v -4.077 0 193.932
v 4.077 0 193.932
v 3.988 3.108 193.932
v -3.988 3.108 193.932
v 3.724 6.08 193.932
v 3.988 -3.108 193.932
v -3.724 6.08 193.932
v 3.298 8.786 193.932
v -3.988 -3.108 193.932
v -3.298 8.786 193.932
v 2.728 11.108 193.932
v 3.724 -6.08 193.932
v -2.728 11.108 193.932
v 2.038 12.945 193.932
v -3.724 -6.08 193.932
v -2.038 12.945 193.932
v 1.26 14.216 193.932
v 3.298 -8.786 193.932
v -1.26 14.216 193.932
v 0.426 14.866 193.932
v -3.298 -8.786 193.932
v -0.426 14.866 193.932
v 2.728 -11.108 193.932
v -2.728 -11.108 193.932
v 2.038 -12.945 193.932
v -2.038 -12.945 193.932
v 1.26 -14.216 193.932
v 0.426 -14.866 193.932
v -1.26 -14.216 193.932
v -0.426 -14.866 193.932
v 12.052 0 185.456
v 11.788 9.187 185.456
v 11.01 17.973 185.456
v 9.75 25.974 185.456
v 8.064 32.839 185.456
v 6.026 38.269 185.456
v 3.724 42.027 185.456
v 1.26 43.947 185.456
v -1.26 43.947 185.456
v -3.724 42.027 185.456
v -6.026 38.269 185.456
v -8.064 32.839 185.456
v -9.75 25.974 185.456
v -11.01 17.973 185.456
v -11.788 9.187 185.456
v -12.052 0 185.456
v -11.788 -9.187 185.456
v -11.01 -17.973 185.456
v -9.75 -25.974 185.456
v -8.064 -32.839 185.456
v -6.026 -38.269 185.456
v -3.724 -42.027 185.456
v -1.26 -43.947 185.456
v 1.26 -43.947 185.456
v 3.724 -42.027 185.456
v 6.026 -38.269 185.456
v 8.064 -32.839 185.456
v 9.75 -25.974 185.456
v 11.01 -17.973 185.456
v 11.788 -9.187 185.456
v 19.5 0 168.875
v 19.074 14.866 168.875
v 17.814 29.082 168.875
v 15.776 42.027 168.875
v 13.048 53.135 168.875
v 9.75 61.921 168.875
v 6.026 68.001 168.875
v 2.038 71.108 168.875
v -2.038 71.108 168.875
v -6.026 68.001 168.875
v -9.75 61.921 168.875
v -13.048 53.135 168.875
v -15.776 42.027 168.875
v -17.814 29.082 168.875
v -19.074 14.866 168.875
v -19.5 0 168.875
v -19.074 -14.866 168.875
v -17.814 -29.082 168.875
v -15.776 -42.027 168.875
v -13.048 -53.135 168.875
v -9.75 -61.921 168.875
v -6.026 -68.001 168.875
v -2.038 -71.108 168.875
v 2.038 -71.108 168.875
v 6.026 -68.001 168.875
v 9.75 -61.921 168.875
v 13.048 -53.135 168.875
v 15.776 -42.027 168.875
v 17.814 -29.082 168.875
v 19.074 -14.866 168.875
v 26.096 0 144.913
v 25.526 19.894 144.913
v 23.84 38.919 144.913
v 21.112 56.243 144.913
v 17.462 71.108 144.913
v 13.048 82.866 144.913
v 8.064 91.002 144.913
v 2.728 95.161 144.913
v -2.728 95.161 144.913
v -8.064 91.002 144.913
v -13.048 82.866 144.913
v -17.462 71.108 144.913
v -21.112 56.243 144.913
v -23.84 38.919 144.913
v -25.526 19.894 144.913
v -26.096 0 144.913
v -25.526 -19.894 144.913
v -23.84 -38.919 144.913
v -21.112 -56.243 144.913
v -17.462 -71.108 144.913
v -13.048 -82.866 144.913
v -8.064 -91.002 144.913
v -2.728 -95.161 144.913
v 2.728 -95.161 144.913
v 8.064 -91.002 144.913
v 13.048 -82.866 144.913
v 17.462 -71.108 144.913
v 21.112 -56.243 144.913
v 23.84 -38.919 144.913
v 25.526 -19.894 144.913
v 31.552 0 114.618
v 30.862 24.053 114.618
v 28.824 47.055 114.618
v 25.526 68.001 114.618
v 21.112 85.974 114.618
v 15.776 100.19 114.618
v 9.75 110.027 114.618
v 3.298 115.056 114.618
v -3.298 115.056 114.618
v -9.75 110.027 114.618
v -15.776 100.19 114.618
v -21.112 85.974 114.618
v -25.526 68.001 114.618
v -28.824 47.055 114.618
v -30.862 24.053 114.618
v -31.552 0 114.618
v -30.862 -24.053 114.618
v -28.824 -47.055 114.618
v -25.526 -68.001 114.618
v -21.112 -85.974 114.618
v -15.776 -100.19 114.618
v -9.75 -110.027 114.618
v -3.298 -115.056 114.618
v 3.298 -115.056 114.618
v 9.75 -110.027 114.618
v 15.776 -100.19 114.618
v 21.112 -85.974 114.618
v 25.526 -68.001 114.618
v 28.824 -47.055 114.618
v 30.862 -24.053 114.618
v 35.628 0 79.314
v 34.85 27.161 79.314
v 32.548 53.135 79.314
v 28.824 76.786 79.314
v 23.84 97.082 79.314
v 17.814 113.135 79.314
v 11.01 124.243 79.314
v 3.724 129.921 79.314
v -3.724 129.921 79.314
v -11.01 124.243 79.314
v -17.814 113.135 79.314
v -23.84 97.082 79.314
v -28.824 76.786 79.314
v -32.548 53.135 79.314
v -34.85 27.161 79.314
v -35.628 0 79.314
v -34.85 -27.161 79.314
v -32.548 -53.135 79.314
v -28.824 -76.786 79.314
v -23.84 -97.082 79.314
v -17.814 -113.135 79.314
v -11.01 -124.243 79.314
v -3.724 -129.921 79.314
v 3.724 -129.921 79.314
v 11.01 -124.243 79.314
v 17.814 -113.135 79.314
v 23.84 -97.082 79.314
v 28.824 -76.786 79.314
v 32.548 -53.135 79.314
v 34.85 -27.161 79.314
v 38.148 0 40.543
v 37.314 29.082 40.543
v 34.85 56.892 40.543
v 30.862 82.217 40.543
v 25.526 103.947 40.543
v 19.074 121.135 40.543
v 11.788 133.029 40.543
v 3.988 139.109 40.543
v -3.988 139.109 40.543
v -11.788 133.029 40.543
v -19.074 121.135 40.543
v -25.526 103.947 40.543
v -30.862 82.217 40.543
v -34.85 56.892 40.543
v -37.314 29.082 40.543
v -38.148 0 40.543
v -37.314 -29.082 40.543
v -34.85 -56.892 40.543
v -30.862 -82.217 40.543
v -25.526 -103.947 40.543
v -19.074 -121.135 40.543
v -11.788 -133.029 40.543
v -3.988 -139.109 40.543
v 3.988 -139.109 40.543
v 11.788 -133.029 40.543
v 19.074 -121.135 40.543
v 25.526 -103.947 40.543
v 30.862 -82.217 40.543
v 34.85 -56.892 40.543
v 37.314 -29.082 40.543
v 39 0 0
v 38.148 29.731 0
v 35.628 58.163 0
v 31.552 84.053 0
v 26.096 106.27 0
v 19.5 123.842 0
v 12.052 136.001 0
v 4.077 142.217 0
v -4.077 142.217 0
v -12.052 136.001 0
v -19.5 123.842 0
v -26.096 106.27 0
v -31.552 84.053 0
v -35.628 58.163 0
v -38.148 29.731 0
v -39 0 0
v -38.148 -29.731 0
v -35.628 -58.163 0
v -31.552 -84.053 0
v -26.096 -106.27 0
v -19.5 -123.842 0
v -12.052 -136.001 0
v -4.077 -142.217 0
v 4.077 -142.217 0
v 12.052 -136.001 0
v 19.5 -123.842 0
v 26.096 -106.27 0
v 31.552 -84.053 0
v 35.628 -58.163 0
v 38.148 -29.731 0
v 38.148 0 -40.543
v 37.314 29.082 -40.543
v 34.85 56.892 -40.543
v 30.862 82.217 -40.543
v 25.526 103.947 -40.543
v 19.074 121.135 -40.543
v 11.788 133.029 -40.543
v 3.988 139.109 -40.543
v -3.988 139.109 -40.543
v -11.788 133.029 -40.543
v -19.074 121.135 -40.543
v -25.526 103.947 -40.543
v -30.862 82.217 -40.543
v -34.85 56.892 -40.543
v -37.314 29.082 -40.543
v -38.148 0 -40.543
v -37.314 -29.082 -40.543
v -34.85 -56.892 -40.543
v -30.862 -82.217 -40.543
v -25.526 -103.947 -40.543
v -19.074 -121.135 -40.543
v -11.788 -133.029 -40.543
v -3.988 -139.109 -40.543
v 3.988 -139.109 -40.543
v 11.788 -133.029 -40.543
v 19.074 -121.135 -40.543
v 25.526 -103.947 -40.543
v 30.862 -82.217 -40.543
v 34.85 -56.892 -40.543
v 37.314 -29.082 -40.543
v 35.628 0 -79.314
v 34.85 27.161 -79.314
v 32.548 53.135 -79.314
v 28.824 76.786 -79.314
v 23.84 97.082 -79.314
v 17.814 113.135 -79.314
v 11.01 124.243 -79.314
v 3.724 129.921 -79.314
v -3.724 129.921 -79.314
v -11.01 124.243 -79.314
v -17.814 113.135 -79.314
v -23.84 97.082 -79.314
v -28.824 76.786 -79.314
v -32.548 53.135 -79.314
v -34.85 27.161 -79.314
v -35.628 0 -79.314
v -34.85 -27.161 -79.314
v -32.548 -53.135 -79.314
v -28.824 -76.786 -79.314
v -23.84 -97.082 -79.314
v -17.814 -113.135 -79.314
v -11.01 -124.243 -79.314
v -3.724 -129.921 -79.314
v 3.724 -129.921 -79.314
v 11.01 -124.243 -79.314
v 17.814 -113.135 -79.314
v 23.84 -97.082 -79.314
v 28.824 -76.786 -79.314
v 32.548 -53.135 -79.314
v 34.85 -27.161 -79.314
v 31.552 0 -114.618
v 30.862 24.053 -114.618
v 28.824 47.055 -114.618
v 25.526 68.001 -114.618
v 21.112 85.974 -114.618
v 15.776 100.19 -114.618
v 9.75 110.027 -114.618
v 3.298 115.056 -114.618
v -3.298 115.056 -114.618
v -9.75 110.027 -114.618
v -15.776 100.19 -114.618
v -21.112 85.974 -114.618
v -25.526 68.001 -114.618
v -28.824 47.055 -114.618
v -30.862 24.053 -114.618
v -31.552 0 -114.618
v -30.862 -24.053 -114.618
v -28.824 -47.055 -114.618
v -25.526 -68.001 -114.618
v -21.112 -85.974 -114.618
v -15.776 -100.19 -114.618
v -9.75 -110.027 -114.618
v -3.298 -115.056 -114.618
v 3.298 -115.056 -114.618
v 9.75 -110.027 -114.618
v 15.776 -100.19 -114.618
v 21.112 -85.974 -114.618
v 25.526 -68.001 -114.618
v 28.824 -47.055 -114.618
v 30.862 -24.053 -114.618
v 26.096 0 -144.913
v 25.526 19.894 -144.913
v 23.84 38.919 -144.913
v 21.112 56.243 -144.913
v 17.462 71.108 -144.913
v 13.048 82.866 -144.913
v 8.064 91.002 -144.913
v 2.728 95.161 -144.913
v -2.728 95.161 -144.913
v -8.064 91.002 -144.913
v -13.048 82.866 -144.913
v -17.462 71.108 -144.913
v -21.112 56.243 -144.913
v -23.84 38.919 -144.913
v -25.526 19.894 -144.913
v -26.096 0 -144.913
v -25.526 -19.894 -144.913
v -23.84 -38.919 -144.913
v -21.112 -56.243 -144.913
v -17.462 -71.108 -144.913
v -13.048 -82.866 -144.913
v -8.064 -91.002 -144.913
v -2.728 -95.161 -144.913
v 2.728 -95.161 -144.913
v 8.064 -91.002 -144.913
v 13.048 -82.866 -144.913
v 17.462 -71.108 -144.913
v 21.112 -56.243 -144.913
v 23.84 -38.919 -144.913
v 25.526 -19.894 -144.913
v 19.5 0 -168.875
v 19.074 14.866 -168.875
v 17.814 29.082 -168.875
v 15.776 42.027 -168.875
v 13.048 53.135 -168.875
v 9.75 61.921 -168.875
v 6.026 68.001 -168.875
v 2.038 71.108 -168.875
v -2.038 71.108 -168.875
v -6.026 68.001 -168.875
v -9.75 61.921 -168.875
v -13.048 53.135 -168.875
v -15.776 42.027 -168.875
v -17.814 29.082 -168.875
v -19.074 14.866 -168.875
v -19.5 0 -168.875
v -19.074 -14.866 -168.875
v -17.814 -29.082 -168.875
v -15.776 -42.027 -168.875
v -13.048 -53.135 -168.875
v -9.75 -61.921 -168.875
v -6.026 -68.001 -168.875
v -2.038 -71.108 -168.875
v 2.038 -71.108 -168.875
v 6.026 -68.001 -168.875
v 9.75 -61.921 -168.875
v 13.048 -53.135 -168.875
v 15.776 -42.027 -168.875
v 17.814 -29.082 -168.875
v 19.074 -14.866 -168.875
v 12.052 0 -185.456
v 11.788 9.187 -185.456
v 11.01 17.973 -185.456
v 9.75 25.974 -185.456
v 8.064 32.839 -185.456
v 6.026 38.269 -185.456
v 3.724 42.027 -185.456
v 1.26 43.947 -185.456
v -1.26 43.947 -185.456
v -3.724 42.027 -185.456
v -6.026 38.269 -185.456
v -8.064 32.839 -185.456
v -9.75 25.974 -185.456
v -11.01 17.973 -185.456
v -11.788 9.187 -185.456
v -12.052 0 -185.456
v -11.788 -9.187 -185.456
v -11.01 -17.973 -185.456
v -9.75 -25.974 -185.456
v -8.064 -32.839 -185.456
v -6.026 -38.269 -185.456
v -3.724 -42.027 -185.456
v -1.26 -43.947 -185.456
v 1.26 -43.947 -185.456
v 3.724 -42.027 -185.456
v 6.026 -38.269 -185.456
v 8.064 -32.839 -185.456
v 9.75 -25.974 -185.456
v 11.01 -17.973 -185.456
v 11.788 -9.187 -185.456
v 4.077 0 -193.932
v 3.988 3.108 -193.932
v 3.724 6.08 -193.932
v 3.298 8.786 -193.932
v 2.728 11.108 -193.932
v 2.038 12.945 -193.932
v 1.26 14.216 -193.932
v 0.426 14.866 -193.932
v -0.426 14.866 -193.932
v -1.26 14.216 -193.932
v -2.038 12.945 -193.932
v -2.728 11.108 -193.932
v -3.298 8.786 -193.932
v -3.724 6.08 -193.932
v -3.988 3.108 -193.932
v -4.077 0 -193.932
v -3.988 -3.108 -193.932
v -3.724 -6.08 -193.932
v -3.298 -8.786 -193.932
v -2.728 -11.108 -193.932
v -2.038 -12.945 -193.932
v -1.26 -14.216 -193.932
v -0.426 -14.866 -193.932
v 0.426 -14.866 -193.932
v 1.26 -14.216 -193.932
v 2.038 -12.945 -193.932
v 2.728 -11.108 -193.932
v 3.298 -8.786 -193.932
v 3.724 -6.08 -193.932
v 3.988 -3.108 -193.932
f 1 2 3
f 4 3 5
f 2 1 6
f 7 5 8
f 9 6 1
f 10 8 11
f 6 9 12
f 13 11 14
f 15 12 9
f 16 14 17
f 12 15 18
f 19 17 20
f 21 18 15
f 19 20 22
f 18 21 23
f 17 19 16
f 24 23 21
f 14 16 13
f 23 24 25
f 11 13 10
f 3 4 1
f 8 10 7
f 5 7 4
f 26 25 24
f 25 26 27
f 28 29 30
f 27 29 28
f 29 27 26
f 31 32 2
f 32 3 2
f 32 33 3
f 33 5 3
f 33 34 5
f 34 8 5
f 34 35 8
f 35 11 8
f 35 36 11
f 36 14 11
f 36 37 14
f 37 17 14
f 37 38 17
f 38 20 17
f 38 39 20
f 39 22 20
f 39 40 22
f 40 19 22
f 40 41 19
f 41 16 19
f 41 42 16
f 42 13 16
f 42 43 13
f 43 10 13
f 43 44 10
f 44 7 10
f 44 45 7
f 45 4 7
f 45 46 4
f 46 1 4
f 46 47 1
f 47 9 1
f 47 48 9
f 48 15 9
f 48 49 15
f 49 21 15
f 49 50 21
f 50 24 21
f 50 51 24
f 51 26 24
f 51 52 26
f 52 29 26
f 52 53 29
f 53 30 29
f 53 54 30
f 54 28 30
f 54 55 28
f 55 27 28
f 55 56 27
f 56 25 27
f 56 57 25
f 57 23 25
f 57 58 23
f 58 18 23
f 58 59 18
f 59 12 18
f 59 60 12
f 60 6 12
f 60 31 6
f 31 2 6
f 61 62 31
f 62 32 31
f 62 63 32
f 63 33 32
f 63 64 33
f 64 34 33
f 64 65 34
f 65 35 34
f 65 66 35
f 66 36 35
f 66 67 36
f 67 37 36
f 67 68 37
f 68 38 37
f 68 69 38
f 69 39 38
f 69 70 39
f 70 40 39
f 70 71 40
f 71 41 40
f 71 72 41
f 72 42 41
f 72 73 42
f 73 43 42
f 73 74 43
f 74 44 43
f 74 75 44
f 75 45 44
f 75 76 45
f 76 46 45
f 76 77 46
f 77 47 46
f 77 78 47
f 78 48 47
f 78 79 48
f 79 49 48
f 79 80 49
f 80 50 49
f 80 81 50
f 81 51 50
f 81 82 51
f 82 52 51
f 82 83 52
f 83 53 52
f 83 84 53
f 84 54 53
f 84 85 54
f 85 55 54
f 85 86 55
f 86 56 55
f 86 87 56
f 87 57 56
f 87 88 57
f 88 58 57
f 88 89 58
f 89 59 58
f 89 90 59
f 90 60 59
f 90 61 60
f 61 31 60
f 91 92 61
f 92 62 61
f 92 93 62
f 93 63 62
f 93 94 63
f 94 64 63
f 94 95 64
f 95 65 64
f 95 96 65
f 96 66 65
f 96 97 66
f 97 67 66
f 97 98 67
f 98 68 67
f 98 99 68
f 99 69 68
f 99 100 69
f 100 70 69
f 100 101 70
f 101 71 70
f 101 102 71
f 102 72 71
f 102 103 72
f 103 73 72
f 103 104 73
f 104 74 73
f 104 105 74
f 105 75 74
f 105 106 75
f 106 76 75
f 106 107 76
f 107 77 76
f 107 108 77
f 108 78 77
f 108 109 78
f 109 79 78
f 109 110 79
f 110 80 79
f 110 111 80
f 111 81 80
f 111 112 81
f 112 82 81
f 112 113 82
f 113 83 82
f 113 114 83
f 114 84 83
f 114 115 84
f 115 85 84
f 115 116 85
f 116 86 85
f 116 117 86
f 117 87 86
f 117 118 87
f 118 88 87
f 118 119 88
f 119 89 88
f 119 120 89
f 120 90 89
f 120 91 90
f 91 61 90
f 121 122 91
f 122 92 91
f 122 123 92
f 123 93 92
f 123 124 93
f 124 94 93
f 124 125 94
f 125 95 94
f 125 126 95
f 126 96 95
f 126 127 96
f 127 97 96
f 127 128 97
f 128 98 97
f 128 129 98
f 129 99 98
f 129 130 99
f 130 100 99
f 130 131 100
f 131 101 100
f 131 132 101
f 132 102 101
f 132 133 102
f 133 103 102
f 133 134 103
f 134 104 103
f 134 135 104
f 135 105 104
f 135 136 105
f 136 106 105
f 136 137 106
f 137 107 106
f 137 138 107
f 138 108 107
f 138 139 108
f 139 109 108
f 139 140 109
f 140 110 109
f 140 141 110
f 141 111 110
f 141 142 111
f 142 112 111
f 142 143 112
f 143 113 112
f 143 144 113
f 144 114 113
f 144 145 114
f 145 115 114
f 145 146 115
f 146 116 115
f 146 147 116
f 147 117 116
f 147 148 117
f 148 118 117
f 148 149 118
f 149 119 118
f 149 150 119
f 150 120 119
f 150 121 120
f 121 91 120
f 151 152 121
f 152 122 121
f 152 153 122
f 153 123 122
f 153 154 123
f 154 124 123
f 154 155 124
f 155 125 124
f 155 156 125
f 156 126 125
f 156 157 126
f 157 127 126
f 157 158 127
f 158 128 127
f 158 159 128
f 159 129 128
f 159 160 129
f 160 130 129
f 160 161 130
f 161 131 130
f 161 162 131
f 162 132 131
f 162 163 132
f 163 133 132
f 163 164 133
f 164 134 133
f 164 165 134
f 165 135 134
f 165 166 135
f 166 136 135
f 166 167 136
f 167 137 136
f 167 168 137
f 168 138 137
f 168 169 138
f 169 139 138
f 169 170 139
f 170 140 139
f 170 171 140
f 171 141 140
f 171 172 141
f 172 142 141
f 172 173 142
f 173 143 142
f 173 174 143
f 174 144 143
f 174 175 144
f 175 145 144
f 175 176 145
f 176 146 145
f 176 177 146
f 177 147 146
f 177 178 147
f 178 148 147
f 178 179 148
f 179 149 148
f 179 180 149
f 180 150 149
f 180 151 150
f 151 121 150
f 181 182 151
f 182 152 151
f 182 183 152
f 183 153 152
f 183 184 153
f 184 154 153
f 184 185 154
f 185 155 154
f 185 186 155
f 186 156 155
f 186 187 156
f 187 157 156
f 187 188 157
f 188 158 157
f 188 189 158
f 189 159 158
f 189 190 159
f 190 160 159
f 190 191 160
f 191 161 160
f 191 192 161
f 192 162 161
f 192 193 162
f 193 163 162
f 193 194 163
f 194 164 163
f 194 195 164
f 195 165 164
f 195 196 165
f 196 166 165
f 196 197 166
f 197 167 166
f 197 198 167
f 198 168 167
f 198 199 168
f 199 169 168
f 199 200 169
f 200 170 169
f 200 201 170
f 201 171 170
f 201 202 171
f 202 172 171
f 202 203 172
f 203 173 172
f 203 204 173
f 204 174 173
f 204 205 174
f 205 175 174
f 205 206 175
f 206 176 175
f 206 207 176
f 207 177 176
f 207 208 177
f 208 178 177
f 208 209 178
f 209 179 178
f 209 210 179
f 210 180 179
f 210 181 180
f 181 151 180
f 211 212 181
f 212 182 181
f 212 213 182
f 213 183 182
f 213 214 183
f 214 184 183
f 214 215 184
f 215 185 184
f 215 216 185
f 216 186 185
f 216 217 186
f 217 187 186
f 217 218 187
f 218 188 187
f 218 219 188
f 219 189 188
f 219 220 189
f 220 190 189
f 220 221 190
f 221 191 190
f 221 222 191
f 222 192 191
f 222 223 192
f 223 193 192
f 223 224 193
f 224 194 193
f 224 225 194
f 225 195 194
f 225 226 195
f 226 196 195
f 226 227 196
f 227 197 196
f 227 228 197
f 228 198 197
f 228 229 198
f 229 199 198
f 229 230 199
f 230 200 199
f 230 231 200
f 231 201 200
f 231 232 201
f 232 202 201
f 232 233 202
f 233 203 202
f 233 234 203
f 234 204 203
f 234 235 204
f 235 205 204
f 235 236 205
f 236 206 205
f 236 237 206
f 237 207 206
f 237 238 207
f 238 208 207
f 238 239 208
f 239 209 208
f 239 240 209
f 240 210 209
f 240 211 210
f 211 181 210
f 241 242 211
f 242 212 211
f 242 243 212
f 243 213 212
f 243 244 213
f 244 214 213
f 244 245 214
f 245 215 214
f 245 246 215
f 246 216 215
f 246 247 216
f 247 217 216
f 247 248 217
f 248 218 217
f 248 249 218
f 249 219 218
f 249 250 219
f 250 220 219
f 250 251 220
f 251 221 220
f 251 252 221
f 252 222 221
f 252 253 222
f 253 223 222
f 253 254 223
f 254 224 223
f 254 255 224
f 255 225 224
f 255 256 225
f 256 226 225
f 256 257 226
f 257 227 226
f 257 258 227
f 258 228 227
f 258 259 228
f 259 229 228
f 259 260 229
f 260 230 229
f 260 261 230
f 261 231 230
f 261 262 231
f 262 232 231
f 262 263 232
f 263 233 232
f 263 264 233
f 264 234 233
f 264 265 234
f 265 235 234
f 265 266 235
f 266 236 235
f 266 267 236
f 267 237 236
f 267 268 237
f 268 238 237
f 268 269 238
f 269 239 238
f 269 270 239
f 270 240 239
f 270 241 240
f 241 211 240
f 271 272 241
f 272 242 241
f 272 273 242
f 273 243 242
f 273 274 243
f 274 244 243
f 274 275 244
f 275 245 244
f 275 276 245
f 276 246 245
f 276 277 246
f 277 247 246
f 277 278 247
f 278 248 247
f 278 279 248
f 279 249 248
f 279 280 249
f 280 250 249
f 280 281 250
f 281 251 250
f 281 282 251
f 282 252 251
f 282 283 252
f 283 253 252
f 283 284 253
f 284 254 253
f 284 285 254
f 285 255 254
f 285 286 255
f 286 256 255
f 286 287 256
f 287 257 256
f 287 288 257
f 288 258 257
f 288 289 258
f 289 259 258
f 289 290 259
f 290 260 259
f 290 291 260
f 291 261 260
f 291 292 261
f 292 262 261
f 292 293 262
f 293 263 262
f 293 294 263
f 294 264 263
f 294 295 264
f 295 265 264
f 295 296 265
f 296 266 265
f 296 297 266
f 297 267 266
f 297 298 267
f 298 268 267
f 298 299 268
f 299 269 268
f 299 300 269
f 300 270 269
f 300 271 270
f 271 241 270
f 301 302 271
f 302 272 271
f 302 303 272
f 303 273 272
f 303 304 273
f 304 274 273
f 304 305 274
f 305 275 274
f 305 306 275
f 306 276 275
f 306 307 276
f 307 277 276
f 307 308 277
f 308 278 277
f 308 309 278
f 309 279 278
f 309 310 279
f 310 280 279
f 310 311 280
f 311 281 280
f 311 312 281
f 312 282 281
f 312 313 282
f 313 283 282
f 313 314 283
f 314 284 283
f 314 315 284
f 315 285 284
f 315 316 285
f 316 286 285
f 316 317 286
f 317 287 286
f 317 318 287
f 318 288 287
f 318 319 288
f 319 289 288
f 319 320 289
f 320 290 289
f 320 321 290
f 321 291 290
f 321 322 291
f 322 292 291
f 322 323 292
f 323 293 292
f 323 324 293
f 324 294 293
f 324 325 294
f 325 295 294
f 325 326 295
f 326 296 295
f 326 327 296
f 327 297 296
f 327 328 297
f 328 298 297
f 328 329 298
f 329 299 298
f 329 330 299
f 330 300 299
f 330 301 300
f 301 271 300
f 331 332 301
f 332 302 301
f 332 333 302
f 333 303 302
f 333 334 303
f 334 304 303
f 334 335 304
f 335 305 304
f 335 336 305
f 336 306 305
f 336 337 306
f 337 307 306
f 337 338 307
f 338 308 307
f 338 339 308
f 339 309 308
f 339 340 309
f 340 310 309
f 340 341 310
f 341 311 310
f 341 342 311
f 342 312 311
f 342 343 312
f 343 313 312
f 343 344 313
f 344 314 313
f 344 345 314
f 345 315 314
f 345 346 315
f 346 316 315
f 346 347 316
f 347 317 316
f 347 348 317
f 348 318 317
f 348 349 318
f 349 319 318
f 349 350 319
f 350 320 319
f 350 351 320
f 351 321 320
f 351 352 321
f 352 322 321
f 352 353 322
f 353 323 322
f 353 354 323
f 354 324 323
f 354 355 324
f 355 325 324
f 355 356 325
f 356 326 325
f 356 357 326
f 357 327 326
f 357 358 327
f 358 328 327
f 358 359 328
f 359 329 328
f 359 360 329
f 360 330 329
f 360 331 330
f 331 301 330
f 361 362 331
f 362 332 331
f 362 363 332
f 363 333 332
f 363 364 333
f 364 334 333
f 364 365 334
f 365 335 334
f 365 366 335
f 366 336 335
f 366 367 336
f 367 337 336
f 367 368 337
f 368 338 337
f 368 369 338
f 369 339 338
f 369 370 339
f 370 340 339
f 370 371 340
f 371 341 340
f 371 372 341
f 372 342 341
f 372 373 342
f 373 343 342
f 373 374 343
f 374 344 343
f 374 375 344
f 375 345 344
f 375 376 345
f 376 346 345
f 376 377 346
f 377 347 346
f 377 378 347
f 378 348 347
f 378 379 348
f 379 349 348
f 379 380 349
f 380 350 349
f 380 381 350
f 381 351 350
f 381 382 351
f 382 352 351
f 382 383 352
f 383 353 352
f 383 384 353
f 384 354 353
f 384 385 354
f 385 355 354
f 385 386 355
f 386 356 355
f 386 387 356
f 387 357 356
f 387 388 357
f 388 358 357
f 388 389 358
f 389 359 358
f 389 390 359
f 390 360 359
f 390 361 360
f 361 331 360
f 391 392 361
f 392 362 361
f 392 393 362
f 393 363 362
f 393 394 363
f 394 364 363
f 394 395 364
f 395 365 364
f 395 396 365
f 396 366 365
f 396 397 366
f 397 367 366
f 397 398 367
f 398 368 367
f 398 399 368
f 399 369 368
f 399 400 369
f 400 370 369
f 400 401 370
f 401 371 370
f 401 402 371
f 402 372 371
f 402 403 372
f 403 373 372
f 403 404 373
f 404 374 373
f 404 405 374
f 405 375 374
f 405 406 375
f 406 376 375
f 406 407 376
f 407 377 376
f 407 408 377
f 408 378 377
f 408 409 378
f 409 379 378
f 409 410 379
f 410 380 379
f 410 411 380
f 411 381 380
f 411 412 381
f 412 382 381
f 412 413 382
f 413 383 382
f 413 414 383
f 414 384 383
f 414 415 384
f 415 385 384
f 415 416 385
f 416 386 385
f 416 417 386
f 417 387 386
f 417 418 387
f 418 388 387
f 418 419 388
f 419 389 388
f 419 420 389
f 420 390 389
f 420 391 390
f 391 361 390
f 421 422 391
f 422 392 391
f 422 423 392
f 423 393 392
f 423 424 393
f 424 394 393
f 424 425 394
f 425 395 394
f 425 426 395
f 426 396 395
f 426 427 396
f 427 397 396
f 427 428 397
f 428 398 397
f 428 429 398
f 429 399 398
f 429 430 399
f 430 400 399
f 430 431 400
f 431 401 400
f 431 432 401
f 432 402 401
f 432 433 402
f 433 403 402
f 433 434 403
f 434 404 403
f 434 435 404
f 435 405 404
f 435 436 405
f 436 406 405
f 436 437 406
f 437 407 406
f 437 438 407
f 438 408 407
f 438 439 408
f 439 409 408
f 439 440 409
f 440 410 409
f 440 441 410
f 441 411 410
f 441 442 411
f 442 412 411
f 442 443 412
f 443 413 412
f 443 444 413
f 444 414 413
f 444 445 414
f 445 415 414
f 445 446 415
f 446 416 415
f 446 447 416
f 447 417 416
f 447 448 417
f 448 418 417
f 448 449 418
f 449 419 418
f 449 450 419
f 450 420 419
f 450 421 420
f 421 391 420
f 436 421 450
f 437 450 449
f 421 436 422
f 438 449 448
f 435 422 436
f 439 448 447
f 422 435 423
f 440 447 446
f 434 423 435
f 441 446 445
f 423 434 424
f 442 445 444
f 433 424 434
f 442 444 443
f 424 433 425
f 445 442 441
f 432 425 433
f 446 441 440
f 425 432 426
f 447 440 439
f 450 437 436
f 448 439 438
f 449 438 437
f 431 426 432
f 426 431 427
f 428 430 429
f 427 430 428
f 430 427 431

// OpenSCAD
// Generated by SolidPython 1.0.1 on 2020-07-29 00:46:45


scale(v = [3, 11, 15]) {
	sphere(r = 13);
}
/***********************************************
*********      SolidPython code:      **********
************************************************
 
# import packages: SolidPython
from solid import *
from solid.utils import *
from itertools import chain, combinations, permutations


class Resize:

    def __init__(self, scad_file):
        self.scad_file = scad_file
        #self.scad_file = import_scad(scad_file)
        # cone/cylinder param:
        self.r1 = 0
        self.r2 = 0
        self.h = 0
        # rectangular prism param:
        self.w = 0
        self.l = 0
        # ellipse param:
        self.r = 0

    # import OpenScad code (file name corresponds to shape)


    # classify shape + parameters
    def assign(self, param1, param2, param3):
        if self.scad_file == 'cone.scad':
            self.r1 = param1
            self.r2 = param2
            self.h = param3
        elif self.scad_file == 'cylinder.scad':
            self.r1 = param1
            self.r2 = param2
            self.h = param3
        elif self.scad_file == 'rectangularPrism.scad':
            self.h = param1
            self.l = param2
            self.w = param3
        else:
            self.r = param1
            self.h = param2

    # resize parameters
    def iterate(self):
        x = range(3, 20, 2)
        i = 1
        if self.scad_file == 'cone.scad':
            tempList = list(permutations(x, 2))
            for temp in tempList:
                param1 = temp[0]
                param2 = temp[1]
                filepath = 'produced_scad_files/' + 'cone' + str(param1) + '_' + str(param2) + '_' + '.scad'
                scad_render_to_file(cylinder(h=param1, r1=param2, r2=0), filepath)

        elif self.scad_file == 'cylinder.scad':
            tempList = list(permutations(x, 3))
            for temp in tempList:
                param1 = temp[0]
                param2 = temp[1]
                filepath = 'produced_scad_files/' + 'cylinder' + str(param1) + '_' + str(param2) + '_' + '.scad'
                scad_render_to_file(cylinder(h=param1, r1=param2, r2=param2), filepath)

        elif self.scad_file == 'rectangularPrism.scad':
            tempList = list(permutations(x, 3))
            for temp in tempList:
                param1 = temp[0]
                param2 = temp[1]
                param3 = temp[2]
                filepath = 'produced_scad_files/' + 'rectangularPrism' + str(param1) + '_' + str(param2) + '_' + str(
                    param3) + '.scad'
                scad_render_to_file(cube(size=(param1, param2, param3)), filepath)

        elif self.scad_file == 'ellipse.scad':
            tempList = list(permutations(x, 4))
            for temp in tempList:
                param1 = temp[0]
                param2 = temp[1]
                param3 = temp[2]
                param4 = temp[3]
                filepath = 'produced_scad_files/' + 'ellipse' + str(param1) + '_' + str(param2) + '_' + str(param3) + '_' + str(param4) + '.scad'
                scad_render_to_file(scale([param1, param2, param3])(sphere(r=param4)), filepath)

    def render_to_scadfile(self):
        scad_render_to_file(scad, 'example.scad') 
 
************************************************/
